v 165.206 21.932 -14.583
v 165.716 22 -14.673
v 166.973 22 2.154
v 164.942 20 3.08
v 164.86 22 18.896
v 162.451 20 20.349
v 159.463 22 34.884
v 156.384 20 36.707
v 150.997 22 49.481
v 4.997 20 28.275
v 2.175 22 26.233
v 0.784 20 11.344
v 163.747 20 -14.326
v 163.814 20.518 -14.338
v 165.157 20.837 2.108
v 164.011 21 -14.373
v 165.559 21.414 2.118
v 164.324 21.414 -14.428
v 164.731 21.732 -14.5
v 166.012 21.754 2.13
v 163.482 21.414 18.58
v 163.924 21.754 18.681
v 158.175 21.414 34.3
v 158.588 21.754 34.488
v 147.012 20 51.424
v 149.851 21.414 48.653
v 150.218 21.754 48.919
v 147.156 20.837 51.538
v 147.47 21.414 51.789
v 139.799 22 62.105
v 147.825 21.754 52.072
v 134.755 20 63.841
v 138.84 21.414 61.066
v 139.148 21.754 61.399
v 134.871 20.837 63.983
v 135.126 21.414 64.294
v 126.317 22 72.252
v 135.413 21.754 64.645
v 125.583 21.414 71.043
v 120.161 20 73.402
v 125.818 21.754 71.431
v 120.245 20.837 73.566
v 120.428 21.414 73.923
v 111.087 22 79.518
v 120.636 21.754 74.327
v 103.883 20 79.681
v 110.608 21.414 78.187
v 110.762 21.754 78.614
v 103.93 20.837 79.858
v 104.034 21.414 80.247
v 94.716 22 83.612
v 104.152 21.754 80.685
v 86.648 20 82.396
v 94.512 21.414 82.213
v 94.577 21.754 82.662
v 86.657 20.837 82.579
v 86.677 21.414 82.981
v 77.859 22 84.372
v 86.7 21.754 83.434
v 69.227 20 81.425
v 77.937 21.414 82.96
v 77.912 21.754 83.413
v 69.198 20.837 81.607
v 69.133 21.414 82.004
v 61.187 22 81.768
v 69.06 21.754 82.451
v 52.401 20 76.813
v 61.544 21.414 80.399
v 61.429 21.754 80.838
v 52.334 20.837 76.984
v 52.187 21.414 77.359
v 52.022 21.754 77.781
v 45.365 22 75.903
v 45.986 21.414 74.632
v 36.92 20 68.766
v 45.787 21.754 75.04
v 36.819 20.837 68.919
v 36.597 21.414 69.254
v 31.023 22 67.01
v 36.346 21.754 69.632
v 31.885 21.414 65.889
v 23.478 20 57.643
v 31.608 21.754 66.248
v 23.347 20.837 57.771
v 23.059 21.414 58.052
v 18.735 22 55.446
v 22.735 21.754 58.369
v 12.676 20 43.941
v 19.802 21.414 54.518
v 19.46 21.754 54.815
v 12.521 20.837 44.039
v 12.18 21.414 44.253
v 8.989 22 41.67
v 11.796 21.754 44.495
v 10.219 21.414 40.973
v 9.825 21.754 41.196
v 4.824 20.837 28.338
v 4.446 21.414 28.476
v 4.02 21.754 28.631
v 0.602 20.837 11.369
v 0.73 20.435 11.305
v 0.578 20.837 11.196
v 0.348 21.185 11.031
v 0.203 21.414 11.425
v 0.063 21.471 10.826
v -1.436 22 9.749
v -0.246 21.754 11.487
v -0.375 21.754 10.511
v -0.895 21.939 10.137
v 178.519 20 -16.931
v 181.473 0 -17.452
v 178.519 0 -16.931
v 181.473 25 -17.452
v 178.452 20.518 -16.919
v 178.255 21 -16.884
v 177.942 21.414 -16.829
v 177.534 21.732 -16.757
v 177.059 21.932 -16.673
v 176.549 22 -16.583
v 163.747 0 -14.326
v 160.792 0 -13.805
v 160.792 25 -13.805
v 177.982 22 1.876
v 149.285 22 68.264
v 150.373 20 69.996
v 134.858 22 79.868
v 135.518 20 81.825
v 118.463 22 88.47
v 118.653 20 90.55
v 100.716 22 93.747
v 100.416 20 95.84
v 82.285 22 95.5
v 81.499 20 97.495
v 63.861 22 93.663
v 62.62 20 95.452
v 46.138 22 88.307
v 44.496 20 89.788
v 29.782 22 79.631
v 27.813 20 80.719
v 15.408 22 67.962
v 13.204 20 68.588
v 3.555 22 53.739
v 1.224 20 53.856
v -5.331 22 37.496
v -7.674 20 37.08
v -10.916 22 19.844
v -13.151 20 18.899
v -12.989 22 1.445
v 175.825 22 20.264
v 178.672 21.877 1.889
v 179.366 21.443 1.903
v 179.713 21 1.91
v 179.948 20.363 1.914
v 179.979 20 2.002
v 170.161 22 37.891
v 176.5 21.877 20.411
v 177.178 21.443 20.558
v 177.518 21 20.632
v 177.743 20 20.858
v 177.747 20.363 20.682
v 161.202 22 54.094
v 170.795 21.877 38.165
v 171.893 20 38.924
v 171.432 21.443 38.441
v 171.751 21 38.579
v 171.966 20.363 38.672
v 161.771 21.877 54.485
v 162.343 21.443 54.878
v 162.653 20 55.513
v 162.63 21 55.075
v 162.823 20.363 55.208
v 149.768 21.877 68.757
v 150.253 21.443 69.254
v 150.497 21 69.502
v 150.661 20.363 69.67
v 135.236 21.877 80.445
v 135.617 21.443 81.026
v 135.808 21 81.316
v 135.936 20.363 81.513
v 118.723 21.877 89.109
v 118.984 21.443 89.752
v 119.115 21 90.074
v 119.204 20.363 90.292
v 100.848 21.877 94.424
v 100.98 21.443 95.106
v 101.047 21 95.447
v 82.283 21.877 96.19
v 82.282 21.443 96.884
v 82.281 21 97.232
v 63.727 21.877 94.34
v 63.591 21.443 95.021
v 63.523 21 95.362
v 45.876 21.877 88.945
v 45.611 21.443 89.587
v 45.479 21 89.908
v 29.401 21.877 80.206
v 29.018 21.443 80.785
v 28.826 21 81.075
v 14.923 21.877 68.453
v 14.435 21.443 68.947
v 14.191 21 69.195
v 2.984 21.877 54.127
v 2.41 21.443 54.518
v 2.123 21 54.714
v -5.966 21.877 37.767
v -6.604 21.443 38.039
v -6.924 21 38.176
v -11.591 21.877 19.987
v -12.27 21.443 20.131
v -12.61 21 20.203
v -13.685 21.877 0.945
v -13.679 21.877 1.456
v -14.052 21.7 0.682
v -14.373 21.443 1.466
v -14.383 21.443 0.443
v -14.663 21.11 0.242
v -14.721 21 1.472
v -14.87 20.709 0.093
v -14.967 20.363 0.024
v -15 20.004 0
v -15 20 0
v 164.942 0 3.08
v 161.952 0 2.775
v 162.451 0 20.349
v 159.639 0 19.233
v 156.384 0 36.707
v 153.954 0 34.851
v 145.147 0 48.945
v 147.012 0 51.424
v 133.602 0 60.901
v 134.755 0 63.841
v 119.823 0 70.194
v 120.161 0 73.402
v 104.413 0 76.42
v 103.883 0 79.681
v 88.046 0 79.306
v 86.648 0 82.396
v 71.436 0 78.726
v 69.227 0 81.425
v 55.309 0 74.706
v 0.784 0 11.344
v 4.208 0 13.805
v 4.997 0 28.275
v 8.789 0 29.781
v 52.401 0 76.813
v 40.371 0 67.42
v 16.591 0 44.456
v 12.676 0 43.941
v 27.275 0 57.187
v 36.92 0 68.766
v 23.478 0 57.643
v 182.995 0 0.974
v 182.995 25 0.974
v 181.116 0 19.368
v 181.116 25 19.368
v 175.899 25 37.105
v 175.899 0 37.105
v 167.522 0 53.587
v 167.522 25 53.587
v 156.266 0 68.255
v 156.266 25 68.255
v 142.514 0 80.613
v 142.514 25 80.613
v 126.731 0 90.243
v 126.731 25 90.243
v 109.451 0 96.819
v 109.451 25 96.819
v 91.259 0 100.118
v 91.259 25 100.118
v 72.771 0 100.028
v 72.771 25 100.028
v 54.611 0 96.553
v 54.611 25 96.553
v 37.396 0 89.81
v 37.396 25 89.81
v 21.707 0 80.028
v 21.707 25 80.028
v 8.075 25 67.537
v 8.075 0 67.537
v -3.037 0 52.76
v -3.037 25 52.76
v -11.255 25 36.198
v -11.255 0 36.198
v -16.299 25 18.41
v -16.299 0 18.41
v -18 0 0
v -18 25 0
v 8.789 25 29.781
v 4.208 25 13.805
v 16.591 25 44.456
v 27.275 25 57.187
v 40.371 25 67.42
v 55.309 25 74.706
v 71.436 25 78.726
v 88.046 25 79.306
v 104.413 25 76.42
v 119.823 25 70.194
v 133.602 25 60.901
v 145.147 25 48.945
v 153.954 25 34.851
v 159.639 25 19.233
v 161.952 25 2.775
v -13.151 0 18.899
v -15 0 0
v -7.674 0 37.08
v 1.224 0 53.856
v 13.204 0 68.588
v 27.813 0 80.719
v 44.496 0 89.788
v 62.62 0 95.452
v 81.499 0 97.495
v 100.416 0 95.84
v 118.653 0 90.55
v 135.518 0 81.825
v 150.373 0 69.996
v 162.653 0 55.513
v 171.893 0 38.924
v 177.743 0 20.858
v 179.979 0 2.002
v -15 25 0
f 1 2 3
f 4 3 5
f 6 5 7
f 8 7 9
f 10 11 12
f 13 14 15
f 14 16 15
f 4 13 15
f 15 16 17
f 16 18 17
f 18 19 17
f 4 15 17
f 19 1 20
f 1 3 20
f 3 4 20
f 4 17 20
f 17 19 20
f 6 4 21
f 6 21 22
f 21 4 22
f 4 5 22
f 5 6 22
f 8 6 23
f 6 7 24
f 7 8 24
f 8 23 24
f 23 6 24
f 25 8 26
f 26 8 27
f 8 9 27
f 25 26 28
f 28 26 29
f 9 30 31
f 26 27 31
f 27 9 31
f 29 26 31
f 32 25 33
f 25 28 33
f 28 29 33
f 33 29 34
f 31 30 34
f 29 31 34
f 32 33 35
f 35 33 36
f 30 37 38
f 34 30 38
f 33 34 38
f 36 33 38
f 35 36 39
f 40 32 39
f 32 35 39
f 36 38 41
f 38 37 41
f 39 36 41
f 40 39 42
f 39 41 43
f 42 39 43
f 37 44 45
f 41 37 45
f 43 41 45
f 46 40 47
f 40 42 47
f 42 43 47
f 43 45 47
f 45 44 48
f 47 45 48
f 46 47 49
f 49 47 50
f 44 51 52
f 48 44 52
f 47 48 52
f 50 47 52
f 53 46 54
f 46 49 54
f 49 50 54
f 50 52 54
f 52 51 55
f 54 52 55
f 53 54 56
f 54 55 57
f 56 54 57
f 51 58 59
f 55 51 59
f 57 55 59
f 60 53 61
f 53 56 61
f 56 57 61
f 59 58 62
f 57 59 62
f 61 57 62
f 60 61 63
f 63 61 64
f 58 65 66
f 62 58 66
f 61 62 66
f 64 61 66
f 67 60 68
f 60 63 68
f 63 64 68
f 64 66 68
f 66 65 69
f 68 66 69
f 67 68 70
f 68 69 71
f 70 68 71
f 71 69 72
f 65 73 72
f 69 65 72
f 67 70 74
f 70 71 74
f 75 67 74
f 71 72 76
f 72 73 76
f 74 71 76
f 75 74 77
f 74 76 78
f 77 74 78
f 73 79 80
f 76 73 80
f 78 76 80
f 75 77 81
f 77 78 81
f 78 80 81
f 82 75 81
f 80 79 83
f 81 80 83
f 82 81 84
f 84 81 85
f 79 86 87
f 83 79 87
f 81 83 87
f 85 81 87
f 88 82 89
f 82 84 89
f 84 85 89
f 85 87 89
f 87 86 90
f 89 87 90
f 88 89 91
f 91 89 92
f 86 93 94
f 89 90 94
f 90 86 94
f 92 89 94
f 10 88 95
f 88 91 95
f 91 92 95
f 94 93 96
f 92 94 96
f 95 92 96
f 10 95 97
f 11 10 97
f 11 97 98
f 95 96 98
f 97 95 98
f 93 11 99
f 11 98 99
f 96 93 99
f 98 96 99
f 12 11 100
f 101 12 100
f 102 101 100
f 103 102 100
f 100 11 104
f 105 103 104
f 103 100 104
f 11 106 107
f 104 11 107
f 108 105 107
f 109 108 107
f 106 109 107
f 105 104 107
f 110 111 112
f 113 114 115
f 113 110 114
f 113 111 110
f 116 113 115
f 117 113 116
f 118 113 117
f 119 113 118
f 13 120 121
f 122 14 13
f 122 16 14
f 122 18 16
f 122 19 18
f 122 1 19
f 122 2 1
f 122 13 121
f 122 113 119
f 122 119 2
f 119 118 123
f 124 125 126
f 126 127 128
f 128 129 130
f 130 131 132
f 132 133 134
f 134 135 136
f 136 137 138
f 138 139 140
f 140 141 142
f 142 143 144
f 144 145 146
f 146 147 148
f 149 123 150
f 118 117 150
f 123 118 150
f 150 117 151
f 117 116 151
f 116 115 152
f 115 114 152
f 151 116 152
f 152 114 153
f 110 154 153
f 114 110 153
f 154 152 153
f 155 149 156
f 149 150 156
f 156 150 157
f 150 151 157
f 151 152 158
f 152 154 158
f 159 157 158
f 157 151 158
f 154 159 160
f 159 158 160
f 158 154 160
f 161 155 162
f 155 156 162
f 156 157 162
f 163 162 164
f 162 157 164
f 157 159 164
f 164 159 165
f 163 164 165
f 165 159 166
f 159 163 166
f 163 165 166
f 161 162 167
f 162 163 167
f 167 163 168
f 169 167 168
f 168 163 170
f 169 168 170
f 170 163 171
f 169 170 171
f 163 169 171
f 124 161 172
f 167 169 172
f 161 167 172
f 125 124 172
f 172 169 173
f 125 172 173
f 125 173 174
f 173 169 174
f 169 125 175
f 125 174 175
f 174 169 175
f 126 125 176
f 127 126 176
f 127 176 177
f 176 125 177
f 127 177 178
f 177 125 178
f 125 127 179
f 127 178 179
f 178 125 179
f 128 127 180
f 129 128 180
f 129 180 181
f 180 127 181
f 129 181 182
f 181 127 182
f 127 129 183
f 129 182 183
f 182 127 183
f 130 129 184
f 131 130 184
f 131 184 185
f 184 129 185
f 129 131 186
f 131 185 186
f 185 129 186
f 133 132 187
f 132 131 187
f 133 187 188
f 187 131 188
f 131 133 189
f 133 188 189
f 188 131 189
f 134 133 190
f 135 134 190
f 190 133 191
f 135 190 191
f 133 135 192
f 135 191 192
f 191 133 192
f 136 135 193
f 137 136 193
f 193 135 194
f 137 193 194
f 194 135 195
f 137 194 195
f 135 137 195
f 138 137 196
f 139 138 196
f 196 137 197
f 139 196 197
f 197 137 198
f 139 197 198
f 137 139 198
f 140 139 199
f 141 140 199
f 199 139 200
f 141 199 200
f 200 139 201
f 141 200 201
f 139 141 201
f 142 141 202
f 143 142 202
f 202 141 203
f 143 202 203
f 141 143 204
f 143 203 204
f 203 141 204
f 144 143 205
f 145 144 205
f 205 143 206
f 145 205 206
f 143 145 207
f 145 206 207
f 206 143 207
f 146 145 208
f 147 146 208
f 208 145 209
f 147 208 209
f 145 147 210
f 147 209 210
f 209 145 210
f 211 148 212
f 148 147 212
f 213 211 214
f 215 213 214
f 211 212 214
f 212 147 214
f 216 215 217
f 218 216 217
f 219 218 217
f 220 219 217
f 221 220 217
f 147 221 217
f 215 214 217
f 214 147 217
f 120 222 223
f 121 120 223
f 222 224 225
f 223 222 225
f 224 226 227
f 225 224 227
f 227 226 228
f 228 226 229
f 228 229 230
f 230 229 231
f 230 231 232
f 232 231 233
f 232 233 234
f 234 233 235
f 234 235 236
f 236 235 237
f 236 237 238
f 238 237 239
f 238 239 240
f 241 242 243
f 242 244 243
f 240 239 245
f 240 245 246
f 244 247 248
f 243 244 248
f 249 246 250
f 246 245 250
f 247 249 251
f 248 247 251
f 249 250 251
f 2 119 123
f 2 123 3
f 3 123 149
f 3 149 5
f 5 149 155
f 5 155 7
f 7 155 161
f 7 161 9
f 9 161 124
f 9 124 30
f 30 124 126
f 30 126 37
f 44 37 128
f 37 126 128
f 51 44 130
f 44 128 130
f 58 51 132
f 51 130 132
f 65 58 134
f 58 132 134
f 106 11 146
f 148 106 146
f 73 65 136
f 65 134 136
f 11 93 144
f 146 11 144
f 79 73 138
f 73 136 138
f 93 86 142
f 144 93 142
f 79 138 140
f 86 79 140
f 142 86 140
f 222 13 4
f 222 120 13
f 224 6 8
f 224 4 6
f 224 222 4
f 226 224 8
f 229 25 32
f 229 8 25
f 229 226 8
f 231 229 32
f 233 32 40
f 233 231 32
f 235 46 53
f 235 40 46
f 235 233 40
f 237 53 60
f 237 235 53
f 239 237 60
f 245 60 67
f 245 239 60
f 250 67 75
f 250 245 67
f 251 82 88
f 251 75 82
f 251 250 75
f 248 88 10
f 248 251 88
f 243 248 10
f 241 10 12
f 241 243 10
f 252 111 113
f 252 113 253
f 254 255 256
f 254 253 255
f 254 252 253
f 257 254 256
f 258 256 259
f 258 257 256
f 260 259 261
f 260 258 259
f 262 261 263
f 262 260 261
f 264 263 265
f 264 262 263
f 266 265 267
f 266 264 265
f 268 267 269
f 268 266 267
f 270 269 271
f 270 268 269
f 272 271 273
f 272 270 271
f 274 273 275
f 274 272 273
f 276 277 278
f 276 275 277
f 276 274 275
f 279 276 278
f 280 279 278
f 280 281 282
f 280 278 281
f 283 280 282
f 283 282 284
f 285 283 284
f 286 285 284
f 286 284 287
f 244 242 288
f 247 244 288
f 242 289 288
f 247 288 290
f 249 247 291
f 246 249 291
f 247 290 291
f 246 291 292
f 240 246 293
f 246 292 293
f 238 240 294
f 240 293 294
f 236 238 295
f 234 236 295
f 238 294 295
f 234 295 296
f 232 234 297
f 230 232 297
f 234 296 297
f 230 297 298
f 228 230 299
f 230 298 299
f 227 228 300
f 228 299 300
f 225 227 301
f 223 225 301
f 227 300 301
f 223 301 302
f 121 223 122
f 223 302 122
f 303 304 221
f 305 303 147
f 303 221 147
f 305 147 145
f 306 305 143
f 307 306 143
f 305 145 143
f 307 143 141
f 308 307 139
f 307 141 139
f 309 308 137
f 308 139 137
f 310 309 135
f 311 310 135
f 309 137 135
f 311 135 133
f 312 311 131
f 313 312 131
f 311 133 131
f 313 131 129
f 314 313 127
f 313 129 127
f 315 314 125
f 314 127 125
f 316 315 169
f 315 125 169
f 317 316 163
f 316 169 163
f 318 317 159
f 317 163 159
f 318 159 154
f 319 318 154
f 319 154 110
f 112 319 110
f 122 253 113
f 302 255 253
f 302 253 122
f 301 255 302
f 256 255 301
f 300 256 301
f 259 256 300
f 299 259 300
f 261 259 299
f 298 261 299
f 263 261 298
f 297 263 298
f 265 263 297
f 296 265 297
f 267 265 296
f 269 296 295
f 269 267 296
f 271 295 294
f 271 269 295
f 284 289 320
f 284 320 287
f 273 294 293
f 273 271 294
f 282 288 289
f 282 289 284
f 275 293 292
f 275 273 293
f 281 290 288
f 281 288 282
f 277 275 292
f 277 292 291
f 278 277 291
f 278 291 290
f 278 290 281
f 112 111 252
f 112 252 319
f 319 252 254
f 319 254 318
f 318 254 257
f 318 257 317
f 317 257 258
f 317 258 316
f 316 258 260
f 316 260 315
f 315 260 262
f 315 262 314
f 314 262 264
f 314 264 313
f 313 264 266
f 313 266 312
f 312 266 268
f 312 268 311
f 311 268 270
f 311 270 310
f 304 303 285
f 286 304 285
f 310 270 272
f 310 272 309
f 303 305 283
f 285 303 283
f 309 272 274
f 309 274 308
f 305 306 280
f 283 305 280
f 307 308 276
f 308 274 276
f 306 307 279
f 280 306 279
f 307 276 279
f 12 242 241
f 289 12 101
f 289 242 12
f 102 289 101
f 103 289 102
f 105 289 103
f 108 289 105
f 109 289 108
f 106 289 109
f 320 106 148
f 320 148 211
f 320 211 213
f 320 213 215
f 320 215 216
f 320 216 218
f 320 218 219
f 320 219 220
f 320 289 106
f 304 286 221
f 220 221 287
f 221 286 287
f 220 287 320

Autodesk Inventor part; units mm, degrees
ref_plane "YZ Plane" through (0, 0, 0) normal (1, 0, 0) x (0, 1, 0)
ref_plane "XZ Plane" through (0, 0, 0) normal (0, 1, 0) x (-1, 0, 0)
ref_plane "XY Plane" through (0, 0, 0) normal (0, 0, 1) x (1, 0, 0)
sketch "Sketch1" plane through (0, 0, 0) normal (0, 0, 1) x (1, 0, 0)
  line L0 (-15, 0) -> (-15, 20)
  line L1 (-13, 22) -> (-2, 22)
  line L2 (0, 20) -> (0, 0)
  line L3 (0, 0) -> (3, 0)
  line L4 (3, 0) -> (3, 25)
  line L5 (3, 25) -> (-18, 25)
  line L6 (-18, 25) -> (-18, 0)
  line L7 (-18, 0) -> (-15, 0)
  line L8 (82.5, 0) -> (82.5, 23.5159) construction
  arc A0 (0, 20) -> (-2, 22) centre (-2, 20) ccw
  arc A1 (-13, 22) -> (-15, 20) centre (-13, 20) ccw
  point P0 (-15, 22)
  point P1 (0, 22)
  point P2 (-7.5, 0)
  dimension "d0" = 22
  dimension "d2" = 15
  dimension "d3" = 3
  dimension "d4" = 25
  dimension "d5" = 21
  dimension "d6" = 7.5
  dimension "d7" = 0
  dimension "d8" = 90
  dimension "d9" = 2
  dimension "d15" = 0
revolve "Revolution1" add sketch "Sketch1" angle 190 about axis through (82.5, 0, 0) along (0, 1, 0)
sketch "Sketch2" plane through (-18, 25, 0) normal (0, 1, 0) x (1, 0, 0)
  arc A0 (21, 0) -> (178.7922, 13.805) centre (100.5, 0) ccw projected
  arc A1 (3, 0) -> (196.5188, 16.9307) centre (100.5, 0) ccw projected
  line L0 (100.5, 0) -> (3, 0)
  line L1 (5, 0) -> (16, 0) projected
  line L2 (100.5, 0) -> (22.2078, -13.805)
  line L3 (22.2078, -13.805) -> (3, 0)
  point P0 (18, 0)
  point P1 (21, 0)
  dimension "d12" = 10
extrude "Extrusion1" cut sketch "Sketch2" against normal up to surface (25 mm away) contours A0 L3 L0
equation "\"d6\" = 0.5 * d2"
properties part number "InertiaKitOuter"
